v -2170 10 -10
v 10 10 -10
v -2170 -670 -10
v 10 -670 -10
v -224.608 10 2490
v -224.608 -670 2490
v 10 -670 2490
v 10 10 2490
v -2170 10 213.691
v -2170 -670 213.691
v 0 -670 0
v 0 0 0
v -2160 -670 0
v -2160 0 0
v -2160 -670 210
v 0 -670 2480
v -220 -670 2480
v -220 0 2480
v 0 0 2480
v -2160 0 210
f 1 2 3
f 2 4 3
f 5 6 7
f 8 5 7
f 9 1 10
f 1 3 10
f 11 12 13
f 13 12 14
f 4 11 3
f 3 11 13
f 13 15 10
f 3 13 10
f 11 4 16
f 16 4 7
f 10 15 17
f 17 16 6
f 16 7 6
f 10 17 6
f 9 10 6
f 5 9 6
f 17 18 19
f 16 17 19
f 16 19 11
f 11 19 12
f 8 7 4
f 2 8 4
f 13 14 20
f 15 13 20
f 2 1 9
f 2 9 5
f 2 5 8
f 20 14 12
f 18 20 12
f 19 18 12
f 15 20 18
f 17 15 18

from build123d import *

# Parameters (mm, degrees)
PAD010_DEPTH = 670
PAD_DEPTH    = 10


with BuildPart() as part:
    # Sketch010 → Pad010 (new body)
    with BuildSketch(Plane.XZ):
        Polygon((-2170, 213.690984), (-224.608154, 2490), (10, 2490), (10, -10), (-2170, -10), align=None)
        Polygon((0, 0), (-2160, 0), (-2160, 210), (-220, 2480), (0, 2480), align=None, mode=Mode.SUBTRACT)
    extrude(amount=PAD010_DEPTH)

    # Sketch (on Face11 of Pad010) → Pad (join)
    with BuildSketch(Plane(origin=(0, 0, 0), x_dir=(1, 0, 0), z_dir=(0, 1, 0))):
        Polygon((10, -2490), (10, 10), (-2170, 10), (-2170, -213.690984), (-224.608154, -2490), align=None)
    extrude(amount=PAD_DEPTH)


solid = part.part
